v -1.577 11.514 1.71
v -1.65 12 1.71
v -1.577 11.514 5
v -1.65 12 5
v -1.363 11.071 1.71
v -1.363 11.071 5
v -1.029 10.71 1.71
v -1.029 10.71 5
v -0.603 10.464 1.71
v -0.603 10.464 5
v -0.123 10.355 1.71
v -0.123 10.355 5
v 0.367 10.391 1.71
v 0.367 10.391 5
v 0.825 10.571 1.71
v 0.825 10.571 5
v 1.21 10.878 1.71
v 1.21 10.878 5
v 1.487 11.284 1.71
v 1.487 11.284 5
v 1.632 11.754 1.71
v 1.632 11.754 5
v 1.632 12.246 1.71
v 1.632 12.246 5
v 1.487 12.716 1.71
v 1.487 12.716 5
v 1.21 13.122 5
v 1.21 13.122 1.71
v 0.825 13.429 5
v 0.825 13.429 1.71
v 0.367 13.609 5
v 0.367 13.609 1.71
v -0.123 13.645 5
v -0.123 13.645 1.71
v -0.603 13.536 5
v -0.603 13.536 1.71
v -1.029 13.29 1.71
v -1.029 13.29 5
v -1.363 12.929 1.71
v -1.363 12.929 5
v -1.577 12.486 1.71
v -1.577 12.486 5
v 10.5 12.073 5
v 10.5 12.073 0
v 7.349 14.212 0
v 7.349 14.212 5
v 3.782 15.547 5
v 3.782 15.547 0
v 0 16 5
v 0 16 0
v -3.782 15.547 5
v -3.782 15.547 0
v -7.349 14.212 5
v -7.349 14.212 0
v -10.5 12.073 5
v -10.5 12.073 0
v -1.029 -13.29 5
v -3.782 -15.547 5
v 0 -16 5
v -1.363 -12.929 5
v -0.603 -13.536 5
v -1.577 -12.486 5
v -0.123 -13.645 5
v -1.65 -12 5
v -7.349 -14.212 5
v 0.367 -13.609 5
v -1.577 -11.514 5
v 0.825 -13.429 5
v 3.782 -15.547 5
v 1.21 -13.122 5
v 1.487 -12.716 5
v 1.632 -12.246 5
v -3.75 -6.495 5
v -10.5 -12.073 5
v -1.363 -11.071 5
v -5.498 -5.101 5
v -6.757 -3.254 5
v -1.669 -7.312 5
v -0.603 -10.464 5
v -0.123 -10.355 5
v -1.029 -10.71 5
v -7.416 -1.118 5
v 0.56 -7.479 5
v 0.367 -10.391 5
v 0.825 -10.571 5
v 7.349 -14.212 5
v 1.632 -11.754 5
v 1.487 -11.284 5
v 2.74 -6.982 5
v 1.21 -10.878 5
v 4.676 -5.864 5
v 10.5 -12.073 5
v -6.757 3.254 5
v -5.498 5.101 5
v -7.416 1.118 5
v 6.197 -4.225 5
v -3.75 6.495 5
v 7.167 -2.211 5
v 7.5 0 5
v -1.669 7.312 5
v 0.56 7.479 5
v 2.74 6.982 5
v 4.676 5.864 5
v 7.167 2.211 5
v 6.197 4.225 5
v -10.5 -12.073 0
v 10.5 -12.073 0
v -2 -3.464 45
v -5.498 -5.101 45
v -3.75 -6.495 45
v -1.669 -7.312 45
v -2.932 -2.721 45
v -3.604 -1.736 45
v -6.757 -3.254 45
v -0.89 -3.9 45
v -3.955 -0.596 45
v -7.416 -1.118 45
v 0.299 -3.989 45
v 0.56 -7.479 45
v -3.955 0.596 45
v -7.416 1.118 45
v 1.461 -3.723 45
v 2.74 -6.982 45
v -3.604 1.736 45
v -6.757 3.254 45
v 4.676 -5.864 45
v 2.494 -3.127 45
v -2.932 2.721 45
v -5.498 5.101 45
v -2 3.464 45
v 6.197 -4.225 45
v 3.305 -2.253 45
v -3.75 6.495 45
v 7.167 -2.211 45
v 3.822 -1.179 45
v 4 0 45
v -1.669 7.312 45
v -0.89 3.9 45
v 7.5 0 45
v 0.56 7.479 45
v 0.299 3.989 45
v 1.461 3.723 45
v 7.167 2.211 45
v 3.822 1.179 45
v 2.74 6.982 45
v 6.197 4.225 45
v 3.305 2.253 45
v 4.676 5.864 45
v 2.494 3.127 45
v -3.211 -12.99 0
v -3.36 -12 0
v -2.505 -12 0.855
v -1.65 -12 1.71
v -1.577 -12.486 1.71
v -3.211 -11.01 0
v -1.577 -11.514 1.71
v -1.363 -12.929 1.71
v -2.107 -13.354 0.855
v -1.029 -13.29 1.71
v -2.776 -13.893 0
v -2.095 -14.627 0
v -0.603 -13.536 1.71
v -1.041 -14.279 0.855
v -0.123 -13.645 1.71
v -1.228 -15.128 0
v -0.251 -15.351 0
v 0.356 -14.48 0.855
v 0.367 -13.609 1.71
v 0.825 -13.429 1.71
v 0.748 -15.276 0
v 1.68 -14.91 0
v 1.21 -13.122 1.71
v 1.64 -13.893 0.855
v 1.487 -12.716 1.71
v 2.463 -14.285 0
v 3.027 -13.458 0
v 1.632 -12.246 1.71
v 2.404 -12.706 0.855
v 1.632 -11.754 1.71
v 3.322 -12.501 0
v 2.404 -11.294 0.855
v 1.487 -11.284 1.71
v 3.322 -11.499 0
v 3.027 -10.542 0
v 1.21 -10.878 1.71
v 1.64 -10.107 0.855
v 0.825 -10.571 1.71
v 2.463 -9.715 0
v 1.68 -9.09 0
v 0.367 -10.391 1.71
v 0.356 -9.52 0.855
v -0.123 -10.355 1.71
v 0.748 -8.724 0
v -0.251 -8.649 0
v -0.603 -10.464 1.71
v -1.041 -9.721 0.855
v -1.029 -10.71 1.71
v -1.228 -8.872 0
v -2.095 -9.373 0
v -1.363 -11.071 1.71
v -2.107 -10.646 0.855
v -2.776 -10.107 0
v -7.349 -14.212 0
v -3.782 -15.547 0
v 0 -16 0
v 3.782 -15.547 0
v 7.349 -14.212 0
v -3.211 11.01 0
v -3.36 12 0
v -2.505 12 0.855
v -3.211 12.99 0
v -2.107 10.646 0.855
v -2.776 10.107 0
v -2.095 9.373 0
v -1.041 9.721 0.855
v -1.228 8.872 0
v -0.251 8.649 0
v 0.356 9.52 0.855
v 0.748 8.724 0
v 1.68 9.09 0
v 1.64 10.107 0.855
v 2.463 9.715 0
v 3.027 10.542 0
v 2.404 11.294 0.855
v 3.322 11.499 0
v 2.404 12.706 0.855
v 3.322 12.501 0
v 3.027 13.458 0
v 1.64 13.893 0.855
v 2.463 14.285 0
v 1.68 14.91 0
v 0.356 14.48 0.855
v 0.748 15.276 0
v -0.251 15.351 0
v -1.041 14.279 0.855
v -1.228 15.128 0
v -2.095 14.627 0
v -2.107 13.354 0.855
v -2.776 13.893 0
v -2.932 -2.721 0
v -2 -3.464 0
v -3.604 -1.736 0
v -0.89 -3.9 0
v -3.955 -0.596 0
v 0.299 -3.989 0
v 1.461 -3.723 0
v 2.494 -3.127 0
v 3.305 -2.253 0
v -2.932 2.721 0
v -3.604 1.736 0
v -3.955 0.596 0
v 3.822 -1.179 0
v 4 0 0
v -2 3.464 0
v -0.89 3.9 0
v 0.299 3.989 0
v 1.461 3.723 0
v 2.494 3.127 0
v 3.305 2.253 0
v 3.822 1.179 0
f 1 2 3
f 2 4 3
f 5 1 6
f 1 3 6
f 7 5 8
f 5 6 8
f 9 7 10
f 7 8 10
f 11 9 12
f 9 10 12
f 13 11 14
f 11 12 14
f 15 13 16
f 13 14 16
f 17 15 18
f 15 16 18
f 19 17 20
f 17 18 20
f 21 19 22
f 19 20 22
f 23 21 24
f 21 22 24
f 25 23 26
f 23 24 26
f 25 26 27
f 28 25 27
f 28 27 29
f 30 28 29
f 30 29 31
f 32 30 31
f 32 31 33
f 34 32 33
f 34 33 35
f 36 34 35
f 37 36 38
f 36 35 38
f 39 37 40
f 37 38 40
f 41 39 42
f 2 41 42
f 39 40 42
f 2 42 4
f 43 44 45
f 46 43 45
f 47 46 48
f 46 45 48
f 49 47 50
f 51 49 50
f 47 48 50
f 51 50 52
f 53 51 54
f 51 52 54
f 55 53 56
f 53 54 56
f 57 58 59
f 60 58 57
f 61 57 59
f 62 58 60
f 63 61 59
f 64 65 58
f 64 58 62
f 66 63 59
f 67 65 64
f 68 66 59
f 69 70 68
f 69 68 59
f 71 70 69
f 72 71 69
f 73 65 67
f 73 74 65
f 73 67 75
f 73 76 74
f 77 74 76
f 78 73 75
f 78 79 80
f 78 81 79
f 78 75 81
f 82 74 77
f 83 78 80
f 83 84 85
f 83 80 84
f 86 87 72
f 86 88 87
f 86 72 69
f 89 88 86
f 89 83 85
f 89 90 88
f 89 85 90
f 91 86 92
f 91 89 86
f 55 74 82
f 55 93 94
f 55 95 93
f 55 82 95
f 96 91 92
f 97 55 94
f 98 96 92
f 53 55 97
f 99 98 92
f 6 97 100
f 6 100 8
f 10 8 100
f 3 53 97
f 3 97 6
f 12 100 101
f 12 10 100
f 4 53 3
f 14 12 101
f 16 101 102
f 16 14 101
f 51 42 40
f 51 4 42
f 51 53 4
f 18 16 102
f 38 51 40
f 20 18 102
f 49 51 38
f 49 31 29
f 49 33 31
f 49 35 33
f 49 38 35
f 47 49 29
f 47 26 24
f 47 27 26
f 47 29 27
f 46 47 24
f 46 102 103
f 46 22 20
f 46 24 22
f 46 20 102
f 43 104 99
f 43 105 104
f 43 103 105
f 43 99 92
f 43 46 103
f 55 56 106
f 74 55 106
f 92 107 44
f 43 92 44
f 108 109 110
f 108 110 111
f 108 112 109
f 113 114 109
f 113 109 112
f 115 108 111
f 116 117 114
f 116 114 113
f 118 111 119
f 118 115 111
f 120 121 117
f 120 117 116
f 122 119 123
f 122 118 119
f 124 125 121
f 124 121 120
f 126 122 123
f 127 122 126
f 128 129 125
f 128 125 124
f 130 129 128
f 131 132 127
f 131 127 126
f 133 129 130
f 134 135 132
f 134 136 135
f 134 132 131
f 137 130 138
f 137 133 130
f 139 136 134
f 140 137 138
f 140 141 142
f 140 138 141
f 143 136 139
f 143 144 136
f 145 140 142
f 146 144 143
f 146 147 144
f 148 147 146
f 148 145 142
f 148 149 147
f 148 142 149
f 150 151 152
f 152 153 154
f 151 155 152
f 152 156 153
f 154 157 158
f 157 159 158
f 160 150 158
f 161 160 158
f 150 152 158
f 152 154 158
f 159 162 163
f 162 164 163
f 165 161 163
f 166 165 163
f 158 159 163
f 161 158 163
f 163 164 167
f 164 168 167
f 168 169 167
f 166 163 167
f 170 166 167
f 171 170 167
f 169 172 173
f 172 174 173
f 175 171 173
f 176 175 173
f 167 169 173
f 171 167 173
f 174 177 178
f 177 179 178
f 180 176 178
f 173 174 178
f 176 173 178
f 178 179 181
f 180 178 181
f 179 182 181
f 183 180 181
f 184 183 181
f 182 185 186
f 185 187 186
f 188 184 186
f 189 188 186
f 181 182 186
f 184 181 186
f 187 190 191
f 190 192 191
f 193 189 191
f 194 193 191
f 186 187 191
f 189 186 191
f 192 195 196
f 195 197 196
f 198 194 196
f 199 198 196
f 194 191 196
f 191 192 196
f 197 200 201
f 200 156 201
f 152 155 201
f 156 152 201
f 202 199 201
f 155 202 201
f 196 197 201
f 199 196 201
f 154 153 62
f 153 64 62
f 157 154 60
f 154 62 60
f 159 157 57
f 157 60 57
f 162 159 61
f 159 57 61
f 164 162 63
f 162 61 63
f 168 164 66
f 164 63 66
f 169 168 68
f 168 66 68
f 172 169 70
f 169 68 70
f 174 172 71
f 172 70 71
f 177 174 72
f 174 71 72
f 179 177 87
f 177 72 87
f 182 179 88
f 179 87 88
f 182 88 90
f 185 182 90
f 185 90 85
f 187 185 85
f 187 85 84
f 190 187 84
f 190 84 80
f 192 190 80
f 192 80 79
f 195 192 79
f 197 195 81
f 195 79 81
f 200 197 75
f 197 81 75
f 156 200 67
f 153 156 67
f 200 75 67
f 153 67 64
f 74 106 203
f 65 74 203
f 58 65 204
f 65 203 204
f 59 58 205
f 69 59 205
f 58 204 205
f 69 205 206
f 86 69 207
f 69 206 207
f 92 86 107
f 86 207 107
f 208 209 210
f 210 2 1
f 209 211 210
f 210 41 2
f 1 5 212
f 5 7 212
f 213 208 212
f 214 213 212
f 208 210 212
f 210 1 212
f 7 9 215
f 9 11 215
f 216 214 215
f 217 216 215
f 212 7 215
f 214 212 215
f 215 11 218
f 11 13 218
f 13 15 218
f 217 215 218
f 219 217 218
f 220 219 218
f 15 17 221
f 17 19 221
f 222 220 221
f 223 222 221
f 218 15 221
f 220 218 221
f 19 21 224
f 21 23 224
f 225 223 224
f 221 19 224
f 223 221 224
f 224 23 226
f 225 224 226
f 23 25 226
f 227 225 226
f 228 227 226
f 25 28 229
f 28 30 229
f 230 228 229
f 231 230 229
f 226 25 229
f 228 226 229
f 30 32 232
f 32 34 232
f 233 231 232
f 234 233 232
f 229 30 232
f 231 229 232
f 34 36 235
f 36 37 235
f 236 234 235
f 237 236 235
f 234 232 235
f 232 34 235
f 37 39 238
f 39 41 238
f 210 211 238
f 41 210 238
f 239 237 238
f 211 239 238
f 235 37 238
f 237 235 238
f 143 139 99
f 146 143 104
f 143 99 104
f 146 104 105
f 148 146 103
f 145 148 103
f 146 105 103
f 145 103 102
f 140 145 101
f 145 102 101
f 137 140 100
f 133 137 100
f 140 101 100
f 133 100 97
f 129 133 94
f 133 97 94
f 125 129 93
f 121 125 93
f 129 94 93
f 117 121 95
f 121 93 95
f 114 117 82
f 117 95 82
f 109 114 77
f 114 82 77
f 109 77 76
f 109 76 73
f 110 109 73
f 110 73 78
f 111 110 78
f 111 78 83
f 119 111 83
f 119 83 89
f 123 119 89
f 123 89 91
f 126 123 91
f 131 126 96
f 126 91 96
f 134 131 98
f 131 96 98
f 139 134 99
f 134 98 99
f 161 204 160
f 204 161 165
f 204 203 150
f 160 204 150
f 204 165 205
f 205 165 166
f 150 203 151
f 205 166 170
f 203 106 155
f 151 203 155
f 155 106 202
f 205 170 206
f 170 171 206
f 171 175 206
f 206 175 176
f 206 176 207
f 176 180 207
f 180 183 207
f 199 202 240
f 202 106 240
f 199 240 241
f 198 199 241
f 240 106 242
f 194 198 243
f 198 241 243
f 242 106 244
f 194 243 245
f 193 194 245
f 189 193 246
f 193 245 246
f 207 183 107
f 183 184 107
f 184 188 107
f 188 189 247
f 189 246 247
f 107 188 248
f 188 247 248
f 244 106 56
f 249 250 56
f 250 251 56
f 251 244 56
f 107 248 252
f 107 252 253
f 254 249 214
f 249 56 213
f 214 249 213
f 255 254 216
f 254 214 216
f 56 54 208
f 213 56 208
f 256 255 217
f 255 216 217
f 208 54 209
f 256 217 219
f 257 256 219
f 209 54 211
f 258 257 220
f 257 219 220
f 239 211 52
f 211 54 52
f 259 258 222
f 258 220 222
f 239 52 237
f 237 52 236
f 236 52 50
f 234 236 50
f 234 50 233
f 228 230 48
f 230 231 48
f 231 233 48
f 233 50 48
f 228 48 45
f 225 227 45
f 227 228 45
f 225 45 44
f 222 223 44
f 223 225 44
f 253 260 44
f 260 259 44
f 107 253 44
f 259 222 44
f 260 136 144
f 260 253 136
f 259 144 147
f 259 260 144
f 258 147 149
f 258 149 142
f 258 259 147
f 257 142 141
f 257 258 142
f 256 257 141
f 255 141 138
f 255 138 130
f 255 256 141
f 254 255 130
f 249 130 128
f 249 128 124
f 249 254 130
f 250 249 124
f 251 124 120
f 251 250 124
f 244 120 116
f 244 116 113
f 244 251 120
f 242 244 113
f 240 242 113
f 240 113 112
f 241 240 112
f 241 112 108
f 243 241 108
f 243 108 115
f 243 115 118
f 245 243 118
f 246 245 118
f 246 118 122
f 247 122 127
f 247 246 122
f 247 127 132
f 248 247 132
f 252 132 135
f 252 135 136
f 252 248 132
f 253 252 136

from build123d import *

# Parameters (mm, degrees)
F0_R           = 4
F1_DEPTH       = 5
F2_D           = 3.3
F2_DEPTH       = 10
F2_CSINK_D     = 6.72
F2_CSINK_ANGLE = 90
F2_TIP         = 0.9914200214
F3_R           = 7.5
F3_R_2         = 4
F4_DEPTH       = 40


with BuildPart() as f1:
    # F0 (on Top) → F1 (new body)
    with BuildSketch(Plane.XY):
        with BuildLine():
            ThreePointArc((10.5, 12.0726964676), (0, 16), (-10.5, 12.0726964676))
            Line((-10.5, 12.0726964676), (-10.5, -12.0726964676))
            ThreePointArc((-10.5, -12.0726964676), (0, -16), (10.5, -12.0726964676))
            Line((10.5, -12.0726964676), (10.5, 12.0726964676))
        make_face()
        Circle(F0_R, mode=Mode.SUBTRACT)
    extrude(amount=F1_DEPTH)

    # F2
    with Locations(Plane(origin=(0, 0, 0), x_dir=(1, 0, 0), z_dir=(0, 0, -1))):
        with Locations((0, -12), (0, 12)):
            CounterSinkHole(F2_D / 2, F2_CSINK_D / 2, depth=F2_DEPTH, counter_sink_angle=F2_CSINK_ANGLE)
            with Locations((0, 0, -(F2_DEPTH + F2_TIP / 2))):  # 118° drill point
                Cone(0, F2_D / 2, F2_TIP, mode=Mode.SUBTRACT)

    # F3 (on face) → F4 (join)
    with BuildSketch(Plane.XY.offset(5)):
        Circle(F3_R)
        Circle(F3_R_2, mode=Mode.SUBTRACT)
    extrude(amount=F4_DEPTH)


solid = f1.part
